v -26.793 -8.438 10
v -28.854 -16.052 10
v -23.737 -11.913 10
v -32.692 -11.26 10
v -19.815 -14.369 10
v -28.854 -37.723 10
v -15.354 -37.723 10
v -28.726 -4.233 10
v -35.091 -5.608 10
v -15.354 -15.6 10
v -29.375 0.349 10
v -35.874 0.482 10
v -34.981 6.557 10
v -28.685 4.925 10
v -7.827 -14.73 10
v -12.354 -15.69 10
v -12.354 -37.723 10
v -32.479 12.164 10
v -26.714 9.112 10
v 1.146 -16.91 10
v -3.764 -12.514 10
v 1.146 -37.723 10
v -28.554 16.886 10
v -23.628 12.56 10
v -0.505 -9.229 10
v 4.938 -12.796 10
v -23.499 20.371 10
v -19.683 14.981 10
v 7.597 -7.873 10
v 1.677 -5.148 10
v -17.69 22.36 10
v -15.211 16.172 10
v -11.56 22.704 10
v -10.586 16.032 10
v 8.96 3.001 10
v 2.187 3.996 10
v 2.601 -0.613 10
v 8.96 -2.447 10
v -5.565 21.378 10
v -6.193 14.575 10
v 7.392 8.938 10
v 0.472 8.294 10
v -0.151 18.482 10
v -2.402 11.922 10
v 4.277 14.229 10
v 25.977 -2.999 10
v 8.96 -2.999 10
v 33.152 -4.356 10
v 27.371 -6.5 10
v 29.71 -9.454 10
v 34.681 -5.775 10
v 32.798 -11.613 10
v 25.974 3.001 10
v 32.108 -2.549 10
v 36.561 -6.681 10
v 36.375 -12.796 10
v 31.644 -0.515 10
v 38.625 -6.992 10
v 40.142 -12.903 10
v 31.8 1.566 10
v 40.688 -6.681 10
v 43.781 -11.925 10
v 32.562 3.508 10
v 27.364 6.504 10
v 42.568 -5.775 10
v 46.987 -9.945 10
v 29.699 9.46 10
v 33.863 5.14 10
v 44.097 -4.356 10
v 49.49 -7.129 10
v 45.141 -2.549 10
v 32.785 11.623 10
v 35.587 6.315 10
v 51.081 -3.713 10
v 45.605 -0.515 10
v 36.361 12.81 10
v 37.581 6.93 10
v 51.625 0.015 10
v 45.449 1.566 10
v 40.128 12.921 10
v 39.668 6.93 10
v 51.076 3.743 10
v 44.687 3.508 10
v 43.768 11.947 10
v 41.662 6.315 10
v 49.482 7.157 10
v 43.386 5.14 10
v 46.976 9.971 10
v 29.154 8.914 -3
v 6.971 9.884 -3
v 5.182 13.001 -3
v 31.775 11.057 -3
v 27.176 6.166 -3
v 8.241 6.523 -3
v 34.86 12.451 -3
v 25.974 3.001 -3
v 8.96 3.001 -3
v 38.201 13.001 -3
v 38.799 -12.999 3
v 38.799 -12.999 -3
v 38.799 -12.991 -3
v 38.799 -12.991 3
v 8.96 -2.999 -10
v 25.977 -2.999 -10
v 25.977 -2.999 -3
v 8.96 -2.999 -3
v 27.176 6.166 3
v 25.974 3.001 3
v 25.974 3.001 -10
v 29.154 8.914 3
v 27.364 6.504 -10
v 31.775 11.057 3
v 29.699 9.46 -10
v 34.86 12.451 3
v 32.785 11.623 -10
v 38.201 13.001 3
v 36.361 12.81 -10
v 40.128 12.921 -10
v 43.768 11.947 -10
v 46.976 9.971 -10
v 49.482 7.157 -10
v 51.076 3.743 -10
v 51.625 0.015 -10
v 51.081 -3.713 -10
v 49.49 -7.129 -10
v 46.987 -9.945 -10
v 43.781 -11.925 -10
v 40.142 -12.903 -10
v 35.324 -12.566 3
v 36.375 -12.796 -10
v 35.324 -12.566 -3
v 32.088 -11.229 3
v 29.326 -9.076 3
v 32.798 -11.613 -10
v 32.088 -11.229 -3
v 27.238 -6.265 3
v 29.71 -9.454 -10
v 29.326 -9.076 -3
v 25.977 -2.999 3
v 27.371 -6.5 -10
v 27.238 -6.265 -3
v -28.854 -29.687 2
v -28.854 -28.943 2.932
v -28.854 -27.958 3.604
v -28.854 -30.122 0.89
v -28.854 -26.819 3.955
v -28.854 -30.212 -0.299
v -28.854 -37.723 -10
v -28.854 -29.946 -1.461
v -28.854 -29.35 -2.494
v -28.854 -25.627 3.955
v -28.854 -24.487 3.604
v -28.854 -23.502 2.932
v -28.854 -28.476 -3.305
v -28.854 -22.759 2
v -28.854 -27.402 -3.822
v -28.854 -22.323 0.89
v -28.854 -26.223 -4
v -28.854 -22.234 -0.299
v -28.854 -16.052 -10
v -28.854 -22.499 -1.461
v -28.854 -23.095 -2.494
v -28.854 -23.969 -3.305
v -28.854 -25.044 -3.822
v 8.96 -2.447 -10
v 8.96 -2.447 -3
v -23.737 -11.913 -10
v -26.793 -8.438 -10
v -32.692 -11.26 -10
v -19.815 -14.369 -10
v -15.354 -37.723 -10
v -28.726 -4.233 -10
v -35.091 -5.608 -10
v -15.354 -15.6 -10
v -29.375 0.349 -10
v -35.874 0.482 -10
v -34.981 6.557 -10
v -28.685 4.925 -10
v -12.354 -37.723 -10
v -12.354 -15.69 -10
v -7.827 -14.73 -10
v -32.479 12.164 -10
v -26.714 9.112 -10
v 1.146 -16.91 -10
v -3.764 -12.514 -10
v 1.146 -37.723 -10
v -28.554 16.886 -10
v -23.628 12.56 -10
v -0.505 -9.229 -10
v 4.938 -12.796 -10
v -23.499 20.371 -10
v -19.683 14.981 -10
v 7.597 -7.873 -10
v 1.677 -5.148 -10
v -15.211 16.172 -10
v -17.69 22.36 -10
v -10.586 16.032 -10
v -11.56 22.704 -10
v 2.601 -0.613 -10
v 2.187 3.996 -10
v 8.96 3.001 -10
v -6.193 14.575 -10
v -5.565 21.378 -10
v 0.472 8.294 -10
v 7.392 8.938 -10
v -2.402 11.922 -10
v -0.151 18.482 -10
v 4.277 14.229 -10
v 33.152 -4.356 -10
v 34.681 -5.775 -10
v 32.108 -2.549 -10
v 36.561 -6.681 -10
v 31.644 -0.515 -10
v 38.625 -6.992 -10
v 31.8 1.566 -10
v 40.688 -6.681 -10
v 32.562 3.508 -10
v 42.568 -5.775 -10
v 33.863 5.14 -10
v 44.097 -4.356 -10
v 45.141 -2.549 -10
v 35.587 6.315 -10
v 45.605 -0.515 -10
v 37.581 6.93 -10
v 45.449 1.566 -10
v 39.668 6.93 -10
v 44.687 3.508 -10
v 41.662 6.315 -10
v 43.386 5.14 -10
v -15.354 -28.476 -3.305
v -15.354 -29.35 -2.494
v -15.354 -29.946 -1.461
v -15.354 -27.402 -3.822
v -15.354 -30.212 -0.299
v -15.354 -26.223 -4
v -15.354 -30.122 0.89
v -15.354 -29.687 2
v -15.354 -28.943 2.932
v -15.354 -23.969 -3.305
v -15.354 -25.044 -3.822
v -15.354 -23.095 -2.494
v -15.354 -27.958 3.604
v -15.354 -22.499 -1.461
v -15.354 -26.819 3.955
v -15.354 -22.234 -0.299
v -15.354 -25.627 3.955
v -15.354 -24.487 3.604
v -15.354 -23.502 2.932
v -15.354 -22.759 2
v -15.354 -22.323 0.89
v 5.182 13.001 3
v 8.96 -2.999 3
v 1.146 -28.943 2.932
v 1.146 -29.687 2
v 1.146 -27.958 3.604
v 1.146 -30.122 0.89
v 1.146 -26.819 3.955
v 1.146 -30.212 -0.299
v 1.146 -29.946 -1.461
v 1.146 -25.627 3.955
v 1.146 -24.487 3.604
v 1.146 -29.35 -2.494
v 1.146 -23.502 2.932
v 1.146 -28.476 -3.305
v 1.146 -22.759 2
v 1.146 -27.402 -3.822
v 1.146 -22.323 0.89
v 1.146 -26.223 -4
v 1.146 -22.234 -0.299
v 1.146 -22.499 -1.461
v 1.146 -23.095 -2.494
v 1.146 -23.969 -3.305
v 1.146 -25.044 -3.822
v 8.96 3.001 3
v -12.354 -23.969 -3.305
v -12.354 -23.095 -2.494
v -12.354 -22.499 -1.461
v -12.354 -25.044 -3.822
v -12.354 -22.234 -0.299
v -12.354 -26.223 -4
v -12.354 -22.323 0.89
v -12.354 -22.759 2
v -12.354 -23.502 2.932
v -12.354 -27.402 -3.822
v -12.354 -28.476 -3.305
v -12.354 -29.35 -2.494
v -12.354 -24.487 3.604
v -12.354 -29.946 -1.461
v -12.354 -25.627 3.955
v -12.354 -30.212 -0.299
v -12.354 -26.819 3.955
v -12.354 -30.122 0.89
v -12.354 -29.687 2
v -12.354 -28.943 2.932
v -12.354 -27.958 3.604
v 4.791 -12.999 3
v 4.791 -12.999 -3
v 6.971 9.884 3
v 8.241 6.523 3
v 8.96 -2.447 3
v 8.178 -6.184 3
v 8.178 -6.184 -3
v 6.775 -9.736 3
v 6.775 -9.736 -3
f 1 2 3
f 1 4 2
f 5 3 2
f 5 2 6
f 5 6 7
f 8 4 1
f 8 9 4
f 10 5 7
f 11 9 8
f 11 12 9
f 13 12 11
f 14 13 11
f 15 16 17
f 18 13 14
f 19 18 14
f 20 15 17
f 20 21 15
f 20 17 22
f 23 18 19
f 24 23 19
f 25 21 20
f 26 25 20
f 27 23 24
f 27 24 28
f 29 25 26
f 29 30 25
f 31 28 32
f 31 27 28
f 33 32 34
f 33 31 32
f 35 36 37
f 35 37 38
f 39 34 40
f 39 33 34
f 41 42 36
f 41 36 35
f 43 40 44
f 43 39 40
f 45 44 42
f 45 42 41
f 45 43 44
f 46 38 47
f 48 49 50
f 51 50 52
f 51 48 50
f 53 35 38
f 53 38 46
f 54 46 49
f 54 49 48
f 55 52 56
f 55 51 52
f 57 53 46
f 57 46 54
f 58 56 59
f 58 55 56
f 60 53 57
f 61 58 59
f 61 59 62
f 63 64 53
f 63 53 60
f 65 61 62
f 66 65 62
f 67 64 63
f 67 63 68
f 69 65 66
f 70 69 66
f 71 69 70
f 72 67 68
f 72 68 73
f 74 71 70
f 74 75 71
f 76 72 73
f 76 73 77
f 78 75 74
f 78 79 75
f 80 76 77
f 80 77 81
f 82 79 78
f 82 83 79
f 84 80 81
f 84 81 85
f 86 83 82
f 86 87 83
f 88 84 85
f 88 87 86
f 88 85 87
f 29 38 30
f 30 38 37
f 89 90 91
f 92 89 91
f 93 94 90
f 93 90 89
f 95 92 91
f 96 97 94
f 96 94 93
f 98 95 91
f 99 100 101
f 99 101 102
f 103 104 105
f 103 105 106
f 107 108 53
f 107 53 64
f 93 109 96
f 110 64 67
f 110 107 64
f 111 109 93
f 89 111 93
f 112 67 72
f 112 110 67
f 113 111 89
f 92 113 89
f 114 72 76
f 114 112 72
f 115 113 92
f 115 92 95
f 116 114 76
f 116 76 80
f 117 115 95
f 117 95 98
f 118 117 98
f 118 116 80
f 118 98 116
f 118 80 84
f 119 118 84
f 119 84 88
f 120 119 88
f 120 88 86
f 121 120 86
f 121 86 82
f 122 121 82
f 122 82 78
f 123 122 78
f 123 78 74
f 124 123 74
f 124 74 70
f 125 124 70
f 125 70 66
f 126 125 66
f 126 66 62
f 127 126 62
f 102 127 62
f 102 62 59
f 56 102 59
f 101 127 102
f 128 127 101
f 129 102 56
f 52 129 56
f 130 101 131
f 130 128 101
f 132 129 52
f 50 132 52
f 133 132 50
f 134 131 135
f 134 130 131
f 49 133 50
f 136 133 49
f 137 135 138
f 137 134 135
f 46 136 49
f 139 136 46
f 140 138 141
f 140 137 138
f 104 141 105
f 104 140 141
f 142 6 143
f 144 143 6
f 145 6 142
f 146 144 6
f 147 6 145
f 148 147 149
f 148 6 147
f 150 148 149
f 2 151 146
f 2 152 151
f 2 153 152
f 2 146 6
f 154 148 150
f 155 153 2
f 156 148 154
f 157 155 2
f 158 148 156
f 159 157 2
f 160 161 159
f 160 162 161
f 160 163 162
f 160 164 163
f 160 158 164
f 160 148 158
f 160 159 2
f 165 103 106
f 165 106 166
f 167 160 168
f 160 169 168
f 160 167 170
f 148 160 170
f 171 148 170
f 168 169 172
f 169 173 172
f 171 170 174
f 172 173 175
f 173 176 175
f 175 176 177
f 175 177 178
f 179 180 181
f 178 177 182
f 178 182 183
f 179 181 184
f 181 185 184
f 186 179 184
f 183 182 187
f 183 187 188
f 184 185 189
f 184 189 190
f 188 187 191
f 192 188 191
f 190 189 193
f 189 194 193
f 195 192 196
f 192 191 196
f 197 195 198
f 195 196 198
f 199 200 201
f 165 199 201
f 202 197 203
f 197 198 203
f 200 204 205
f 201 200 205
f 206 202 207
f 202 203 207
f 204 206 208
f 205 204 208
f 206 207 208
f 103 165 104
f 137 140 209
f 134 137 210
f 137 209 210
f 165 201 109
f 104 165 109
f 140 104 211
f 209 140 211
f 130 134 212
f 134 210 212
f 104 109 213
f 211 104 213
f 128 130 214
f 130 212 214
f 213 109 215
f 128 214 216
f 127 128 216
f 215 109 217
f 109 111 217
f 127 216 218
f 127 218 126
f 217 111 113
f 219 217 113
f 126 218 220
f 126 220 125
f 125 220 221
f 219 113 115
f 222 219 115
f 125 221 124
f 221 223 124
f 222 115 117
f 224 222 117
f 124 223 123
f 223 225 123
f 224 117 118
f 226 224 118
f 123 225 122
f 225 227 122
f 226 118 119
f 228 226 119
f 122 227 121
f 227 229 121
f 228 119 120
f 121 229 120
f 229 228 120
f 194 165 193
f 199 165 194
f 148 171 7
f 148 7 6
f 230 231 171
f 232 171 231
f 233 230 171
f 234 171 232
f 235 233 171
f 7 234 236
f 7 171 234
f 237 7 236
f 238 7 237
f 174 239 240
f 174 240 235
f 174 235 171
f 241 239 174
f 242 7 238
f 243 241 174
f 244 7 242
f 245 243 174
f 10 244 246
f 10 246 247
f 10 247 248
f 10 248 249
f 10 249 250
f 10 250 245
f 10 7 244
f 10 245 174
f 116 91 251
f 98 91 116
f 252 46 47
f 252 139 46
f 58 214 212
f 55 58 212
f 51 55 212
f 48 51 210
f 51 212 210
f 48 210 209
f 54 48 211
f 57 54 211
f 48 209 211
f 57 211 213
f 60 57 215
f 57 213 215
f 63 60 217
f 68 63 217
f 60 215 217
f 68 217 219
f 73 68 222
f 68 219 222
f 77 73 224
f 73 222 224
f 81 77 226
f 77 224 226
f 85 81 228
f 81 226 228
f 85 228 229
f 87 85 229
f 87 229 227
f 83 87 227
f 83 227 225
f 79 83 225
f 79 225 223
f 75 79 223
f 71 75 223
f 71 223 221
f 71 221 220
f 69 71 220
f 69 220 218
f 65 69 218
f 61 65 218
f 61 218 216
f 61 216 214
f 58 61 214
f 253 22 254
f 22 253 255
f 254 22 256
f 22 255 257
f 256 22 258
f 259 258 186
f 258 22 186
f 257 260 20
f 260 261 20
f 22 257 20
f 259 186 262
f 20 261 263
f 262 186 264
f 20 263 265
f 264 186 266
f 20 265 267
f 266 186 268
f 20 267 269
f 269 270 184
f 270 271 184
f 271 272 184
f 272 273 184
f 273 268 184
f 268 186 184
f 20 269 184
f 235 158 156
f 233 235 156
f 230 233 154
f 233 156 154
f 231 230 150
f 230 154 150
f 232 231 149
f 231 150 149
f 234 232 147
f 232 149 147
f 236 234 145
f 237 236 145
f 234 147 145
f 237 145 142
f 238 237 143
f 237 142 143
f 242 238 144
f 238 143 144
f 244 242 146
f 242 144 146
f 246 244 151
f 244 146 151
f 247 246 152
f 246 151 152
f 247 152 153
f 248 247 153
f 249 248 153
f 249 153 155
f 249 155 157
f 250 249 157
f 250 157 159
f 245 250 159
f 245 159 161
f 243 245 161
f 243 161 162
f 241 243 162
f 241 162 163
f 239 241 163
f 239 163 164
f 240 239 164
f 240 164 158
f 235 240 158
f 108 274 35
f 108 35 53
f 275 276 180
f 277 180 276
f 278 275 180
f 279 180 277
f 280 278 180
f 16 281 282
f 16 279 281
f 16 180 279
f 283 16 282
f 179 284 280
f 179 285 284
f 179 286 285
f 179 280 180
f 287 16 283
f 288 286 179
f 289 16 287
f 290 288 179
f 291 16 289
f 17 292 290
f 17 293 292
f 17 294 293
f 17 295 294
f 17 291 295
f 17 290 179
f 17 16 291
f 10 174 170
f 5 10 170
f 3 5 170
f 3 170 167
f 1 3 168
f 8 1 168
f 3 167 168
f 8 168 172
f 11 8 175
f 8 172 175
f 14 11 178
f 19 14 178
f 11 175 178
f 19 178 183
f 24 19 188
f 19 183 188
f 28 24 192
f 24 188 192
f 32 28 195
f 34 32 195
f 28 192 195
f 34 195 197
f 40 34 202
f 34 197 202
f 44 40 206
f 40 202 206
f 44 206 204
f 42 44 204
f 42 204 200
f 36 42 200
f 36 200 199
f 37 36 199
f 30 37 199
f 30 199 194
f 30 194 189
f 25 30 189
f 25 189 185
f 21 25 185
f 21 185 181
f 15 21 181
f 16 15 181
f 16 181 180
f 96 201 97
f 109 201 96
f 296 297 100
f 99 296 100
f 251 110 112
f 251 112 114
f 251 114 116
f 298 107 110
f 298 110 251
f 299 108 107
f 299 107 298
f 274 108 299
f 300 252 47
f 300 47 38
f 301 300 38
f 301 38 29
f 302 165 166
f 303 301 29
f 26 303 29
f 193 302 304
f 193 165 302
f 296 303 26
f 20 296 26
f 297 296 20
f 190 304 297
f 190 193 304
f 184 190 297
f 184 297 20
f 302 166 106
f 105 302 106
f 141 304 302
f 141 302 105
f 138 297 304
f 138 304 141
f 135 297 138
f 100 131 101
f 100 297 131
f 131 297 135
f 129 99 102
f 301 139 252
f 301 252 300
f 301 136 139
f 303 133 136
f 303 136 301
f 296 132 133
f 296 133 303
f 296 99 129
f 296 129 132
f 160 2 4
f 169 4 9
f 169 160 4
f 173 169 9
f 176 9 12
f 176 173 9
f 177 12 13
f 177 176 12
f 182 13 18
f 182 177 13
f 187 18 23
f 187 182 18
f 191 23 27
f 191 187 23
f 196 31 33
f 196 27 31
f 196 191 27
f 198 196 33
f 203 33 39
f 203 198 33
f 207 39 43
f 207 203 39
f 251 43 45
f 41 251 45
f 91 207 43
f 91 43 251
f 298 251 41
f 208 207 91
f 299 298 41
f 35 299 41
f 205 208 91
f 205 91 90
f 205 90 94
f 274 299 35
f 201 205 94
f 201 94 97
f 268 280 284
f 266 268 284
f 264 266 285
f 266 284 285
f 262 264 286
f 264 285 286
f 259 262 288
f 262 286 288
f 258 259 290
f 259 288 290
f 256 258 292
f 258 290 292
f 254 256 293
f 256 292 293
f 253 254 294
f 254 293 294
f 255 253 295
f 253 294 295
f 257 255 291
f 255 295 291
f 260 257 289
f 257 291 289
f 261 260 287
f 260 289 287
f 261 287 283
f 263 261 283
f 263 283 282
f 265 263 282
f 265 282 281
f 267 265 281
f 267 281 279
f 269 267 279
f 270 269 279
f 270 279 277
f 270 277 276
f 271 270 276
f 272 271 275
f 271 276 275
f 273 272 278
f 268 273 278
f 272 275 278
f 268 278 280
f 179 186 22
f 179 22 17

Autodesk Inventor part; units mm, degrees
ref_plane "YZ Plane" through (0, 0, 0) normal (1, 0, 0) x (0, 1, 0)
ref_plane "XZ Plane" through (0, 0, 0) normal (0, 1, 0) x (-1, 0, 0)
ref_plane "XY Plane" through (0, 0, 0) normal (0, 0, 1) x (1, 0, 0)
sketch "Szkic1" plane through (0, 0, 0) normal (0, 0, 1) x (1, 0, 0)
  circle A0 centre (-13.3747, 0.2773) radius 22.5
  circle A1 centre (38.6246, 0.0082) radius 13
  line L0 (8.9598, 3.0013) -> (25.9772, 3.0013)
  line L1 (25.9772, 3.0013) -> (25.9772, -2.9987)
  line L2 (25.9772, -2.9987) -> (8.9598, -2.9987)
  line L3 (8.9598, -2.9987) -> (8.9598, 3.0013)
  line L4 (25.9772, 3.0013) -> (8.9598, -2.9987) construction
  line L5 (1.1462, -22.2227) -> (1.1462, -37.7227)
  line L6 (1.1462, -37.7227) -> (-28.8538, -37.7227)
  line L7 (-28.8538, -37.7227) -> (-28.8538, -22.2227)
  line L8 (-28.8538, -22.2227) -> (-28.8538, -16.052)
  line L9 (1.1462, -22.2227) -> (1.1462, -16.9097)
  point P0 (0, 0)
  point P1 (17.4685, 0.0013)
  point P2 (-13.8538, -22.2176)
  point P3 (8.9598, -2.4467)
  point P4 (25.9739, 3.0013)
  dimension "d1" = 26
  dimension "d0" = 45
  dimension "d2" = 52
  dimension "d3" = 6
  dimension "d4" = 30
  dimension "d5" = 38
extrude "Wyciągnięcie proste1" add sketch "Szkic1" along normal mid plane 20
sketch "Szkic2" plane through (0, 0, 10) normal (0, 0, 1) x (1, 0, 0)
  point P0 (0, 0)
sketch "Szkic3" plane through (8.9598, 3.0013, 10) normal (0, 1, 0) x (1, 0, 0)
  line L0 (29.8394, 10) -> (-7.8136, 10)
  line L1 (-7.8136, 20) -> (-7.8136, 0) projected
  line L2 (-7.8136, 13) -> (29.8394, 13)
  line L3 (29.8394, 13) -> (29.8394, 7)
  line L4 (29.8394, 7) -> (-7.8136, 7)
  line L5 (-7.8136, 7) -> (-7.8136, 13)
  line L6 (-7.8136, 13) -> (29.8394, 7) construction
  line L7 (29.8394, 13) -> (-7.8136, 7) construction
  point P0 (-8.9598, 10)
  point P1 (11.0129, 10)
  dimension "d8" = 6
extrude "Wyciągnięcie proste2" add sketch "Szkic3" along normal blind 10 and the other way blind 16
sketch "Szkic4" plane through (0, 0, 10) normal (0, 0, 1) x (1, 0, 0)
  arc A0 (8.9598, 3.0013) -> (-28.8538, -16.052) centre (-13.3747, 0.2773) ccw projected
  arc A1 (25.9772, -2.9987) -> (25.9739, 3.0013) centre (38.6246, 0.0082) ccw projected
  point P0 (0, 0)
sketch "Szkic5" plane through (0, 0, 10) normal (0, 0, 1) x (1, 0, 0)
  line L0 (-12.3538, -38.025) -> (-15.3538, -38.025)
  line L1 (-15.3538, -38.025) -> (-15.3538, -14.6448)
  line L2 (-15.3538, -14.6448) -> (-12.3538, -14.6448)
  line L3 (-12.3538, -14.6448) -> (-12.3538, -38.025)
  line L4 (-12.3538, -38.025) -> (-15.3538, -14.6448) construction
  line L5 (-15.3538, -38.025) -> (-12.3538, -14.6448) construction
  point P0 (0, 0)
  point P1 (-13.8538, -26.3349)
  dimension "d13" = 3
hole "Otwór1" at (-13.3747, 0.2773, 10) direction (0, 0, -1) diameter 32 end through all
sketch "Szkic6" plane through (0, 0, 10) normal (0, 0, 1) x (1, 0, 0)
  arc A0 (25.9772, -2.9987) -> (25.9739, 3.0013) centre (38.6246, 0.0082) ccw projected
  point P0 (0, 0)
hole "Otwór2" at (38.6246, 0.0082, 10) direction (0, 0, -1) diameter 14 end through all
extrude "Wyciągnięcie proste3" cut sketch "Szkic5" against normal through all
sketch "Szkic7" plane through (1.1462, -37.7227, 10) normal (1, 0, 0) x (0, 0, -1)
  point P0 (10, 37.7227)
  point P1 (10, 11.5)
hole "Otwór3" at (1.1462, -26.2227, 0) direction (-1, 0, 0) diameter 8 end through all
